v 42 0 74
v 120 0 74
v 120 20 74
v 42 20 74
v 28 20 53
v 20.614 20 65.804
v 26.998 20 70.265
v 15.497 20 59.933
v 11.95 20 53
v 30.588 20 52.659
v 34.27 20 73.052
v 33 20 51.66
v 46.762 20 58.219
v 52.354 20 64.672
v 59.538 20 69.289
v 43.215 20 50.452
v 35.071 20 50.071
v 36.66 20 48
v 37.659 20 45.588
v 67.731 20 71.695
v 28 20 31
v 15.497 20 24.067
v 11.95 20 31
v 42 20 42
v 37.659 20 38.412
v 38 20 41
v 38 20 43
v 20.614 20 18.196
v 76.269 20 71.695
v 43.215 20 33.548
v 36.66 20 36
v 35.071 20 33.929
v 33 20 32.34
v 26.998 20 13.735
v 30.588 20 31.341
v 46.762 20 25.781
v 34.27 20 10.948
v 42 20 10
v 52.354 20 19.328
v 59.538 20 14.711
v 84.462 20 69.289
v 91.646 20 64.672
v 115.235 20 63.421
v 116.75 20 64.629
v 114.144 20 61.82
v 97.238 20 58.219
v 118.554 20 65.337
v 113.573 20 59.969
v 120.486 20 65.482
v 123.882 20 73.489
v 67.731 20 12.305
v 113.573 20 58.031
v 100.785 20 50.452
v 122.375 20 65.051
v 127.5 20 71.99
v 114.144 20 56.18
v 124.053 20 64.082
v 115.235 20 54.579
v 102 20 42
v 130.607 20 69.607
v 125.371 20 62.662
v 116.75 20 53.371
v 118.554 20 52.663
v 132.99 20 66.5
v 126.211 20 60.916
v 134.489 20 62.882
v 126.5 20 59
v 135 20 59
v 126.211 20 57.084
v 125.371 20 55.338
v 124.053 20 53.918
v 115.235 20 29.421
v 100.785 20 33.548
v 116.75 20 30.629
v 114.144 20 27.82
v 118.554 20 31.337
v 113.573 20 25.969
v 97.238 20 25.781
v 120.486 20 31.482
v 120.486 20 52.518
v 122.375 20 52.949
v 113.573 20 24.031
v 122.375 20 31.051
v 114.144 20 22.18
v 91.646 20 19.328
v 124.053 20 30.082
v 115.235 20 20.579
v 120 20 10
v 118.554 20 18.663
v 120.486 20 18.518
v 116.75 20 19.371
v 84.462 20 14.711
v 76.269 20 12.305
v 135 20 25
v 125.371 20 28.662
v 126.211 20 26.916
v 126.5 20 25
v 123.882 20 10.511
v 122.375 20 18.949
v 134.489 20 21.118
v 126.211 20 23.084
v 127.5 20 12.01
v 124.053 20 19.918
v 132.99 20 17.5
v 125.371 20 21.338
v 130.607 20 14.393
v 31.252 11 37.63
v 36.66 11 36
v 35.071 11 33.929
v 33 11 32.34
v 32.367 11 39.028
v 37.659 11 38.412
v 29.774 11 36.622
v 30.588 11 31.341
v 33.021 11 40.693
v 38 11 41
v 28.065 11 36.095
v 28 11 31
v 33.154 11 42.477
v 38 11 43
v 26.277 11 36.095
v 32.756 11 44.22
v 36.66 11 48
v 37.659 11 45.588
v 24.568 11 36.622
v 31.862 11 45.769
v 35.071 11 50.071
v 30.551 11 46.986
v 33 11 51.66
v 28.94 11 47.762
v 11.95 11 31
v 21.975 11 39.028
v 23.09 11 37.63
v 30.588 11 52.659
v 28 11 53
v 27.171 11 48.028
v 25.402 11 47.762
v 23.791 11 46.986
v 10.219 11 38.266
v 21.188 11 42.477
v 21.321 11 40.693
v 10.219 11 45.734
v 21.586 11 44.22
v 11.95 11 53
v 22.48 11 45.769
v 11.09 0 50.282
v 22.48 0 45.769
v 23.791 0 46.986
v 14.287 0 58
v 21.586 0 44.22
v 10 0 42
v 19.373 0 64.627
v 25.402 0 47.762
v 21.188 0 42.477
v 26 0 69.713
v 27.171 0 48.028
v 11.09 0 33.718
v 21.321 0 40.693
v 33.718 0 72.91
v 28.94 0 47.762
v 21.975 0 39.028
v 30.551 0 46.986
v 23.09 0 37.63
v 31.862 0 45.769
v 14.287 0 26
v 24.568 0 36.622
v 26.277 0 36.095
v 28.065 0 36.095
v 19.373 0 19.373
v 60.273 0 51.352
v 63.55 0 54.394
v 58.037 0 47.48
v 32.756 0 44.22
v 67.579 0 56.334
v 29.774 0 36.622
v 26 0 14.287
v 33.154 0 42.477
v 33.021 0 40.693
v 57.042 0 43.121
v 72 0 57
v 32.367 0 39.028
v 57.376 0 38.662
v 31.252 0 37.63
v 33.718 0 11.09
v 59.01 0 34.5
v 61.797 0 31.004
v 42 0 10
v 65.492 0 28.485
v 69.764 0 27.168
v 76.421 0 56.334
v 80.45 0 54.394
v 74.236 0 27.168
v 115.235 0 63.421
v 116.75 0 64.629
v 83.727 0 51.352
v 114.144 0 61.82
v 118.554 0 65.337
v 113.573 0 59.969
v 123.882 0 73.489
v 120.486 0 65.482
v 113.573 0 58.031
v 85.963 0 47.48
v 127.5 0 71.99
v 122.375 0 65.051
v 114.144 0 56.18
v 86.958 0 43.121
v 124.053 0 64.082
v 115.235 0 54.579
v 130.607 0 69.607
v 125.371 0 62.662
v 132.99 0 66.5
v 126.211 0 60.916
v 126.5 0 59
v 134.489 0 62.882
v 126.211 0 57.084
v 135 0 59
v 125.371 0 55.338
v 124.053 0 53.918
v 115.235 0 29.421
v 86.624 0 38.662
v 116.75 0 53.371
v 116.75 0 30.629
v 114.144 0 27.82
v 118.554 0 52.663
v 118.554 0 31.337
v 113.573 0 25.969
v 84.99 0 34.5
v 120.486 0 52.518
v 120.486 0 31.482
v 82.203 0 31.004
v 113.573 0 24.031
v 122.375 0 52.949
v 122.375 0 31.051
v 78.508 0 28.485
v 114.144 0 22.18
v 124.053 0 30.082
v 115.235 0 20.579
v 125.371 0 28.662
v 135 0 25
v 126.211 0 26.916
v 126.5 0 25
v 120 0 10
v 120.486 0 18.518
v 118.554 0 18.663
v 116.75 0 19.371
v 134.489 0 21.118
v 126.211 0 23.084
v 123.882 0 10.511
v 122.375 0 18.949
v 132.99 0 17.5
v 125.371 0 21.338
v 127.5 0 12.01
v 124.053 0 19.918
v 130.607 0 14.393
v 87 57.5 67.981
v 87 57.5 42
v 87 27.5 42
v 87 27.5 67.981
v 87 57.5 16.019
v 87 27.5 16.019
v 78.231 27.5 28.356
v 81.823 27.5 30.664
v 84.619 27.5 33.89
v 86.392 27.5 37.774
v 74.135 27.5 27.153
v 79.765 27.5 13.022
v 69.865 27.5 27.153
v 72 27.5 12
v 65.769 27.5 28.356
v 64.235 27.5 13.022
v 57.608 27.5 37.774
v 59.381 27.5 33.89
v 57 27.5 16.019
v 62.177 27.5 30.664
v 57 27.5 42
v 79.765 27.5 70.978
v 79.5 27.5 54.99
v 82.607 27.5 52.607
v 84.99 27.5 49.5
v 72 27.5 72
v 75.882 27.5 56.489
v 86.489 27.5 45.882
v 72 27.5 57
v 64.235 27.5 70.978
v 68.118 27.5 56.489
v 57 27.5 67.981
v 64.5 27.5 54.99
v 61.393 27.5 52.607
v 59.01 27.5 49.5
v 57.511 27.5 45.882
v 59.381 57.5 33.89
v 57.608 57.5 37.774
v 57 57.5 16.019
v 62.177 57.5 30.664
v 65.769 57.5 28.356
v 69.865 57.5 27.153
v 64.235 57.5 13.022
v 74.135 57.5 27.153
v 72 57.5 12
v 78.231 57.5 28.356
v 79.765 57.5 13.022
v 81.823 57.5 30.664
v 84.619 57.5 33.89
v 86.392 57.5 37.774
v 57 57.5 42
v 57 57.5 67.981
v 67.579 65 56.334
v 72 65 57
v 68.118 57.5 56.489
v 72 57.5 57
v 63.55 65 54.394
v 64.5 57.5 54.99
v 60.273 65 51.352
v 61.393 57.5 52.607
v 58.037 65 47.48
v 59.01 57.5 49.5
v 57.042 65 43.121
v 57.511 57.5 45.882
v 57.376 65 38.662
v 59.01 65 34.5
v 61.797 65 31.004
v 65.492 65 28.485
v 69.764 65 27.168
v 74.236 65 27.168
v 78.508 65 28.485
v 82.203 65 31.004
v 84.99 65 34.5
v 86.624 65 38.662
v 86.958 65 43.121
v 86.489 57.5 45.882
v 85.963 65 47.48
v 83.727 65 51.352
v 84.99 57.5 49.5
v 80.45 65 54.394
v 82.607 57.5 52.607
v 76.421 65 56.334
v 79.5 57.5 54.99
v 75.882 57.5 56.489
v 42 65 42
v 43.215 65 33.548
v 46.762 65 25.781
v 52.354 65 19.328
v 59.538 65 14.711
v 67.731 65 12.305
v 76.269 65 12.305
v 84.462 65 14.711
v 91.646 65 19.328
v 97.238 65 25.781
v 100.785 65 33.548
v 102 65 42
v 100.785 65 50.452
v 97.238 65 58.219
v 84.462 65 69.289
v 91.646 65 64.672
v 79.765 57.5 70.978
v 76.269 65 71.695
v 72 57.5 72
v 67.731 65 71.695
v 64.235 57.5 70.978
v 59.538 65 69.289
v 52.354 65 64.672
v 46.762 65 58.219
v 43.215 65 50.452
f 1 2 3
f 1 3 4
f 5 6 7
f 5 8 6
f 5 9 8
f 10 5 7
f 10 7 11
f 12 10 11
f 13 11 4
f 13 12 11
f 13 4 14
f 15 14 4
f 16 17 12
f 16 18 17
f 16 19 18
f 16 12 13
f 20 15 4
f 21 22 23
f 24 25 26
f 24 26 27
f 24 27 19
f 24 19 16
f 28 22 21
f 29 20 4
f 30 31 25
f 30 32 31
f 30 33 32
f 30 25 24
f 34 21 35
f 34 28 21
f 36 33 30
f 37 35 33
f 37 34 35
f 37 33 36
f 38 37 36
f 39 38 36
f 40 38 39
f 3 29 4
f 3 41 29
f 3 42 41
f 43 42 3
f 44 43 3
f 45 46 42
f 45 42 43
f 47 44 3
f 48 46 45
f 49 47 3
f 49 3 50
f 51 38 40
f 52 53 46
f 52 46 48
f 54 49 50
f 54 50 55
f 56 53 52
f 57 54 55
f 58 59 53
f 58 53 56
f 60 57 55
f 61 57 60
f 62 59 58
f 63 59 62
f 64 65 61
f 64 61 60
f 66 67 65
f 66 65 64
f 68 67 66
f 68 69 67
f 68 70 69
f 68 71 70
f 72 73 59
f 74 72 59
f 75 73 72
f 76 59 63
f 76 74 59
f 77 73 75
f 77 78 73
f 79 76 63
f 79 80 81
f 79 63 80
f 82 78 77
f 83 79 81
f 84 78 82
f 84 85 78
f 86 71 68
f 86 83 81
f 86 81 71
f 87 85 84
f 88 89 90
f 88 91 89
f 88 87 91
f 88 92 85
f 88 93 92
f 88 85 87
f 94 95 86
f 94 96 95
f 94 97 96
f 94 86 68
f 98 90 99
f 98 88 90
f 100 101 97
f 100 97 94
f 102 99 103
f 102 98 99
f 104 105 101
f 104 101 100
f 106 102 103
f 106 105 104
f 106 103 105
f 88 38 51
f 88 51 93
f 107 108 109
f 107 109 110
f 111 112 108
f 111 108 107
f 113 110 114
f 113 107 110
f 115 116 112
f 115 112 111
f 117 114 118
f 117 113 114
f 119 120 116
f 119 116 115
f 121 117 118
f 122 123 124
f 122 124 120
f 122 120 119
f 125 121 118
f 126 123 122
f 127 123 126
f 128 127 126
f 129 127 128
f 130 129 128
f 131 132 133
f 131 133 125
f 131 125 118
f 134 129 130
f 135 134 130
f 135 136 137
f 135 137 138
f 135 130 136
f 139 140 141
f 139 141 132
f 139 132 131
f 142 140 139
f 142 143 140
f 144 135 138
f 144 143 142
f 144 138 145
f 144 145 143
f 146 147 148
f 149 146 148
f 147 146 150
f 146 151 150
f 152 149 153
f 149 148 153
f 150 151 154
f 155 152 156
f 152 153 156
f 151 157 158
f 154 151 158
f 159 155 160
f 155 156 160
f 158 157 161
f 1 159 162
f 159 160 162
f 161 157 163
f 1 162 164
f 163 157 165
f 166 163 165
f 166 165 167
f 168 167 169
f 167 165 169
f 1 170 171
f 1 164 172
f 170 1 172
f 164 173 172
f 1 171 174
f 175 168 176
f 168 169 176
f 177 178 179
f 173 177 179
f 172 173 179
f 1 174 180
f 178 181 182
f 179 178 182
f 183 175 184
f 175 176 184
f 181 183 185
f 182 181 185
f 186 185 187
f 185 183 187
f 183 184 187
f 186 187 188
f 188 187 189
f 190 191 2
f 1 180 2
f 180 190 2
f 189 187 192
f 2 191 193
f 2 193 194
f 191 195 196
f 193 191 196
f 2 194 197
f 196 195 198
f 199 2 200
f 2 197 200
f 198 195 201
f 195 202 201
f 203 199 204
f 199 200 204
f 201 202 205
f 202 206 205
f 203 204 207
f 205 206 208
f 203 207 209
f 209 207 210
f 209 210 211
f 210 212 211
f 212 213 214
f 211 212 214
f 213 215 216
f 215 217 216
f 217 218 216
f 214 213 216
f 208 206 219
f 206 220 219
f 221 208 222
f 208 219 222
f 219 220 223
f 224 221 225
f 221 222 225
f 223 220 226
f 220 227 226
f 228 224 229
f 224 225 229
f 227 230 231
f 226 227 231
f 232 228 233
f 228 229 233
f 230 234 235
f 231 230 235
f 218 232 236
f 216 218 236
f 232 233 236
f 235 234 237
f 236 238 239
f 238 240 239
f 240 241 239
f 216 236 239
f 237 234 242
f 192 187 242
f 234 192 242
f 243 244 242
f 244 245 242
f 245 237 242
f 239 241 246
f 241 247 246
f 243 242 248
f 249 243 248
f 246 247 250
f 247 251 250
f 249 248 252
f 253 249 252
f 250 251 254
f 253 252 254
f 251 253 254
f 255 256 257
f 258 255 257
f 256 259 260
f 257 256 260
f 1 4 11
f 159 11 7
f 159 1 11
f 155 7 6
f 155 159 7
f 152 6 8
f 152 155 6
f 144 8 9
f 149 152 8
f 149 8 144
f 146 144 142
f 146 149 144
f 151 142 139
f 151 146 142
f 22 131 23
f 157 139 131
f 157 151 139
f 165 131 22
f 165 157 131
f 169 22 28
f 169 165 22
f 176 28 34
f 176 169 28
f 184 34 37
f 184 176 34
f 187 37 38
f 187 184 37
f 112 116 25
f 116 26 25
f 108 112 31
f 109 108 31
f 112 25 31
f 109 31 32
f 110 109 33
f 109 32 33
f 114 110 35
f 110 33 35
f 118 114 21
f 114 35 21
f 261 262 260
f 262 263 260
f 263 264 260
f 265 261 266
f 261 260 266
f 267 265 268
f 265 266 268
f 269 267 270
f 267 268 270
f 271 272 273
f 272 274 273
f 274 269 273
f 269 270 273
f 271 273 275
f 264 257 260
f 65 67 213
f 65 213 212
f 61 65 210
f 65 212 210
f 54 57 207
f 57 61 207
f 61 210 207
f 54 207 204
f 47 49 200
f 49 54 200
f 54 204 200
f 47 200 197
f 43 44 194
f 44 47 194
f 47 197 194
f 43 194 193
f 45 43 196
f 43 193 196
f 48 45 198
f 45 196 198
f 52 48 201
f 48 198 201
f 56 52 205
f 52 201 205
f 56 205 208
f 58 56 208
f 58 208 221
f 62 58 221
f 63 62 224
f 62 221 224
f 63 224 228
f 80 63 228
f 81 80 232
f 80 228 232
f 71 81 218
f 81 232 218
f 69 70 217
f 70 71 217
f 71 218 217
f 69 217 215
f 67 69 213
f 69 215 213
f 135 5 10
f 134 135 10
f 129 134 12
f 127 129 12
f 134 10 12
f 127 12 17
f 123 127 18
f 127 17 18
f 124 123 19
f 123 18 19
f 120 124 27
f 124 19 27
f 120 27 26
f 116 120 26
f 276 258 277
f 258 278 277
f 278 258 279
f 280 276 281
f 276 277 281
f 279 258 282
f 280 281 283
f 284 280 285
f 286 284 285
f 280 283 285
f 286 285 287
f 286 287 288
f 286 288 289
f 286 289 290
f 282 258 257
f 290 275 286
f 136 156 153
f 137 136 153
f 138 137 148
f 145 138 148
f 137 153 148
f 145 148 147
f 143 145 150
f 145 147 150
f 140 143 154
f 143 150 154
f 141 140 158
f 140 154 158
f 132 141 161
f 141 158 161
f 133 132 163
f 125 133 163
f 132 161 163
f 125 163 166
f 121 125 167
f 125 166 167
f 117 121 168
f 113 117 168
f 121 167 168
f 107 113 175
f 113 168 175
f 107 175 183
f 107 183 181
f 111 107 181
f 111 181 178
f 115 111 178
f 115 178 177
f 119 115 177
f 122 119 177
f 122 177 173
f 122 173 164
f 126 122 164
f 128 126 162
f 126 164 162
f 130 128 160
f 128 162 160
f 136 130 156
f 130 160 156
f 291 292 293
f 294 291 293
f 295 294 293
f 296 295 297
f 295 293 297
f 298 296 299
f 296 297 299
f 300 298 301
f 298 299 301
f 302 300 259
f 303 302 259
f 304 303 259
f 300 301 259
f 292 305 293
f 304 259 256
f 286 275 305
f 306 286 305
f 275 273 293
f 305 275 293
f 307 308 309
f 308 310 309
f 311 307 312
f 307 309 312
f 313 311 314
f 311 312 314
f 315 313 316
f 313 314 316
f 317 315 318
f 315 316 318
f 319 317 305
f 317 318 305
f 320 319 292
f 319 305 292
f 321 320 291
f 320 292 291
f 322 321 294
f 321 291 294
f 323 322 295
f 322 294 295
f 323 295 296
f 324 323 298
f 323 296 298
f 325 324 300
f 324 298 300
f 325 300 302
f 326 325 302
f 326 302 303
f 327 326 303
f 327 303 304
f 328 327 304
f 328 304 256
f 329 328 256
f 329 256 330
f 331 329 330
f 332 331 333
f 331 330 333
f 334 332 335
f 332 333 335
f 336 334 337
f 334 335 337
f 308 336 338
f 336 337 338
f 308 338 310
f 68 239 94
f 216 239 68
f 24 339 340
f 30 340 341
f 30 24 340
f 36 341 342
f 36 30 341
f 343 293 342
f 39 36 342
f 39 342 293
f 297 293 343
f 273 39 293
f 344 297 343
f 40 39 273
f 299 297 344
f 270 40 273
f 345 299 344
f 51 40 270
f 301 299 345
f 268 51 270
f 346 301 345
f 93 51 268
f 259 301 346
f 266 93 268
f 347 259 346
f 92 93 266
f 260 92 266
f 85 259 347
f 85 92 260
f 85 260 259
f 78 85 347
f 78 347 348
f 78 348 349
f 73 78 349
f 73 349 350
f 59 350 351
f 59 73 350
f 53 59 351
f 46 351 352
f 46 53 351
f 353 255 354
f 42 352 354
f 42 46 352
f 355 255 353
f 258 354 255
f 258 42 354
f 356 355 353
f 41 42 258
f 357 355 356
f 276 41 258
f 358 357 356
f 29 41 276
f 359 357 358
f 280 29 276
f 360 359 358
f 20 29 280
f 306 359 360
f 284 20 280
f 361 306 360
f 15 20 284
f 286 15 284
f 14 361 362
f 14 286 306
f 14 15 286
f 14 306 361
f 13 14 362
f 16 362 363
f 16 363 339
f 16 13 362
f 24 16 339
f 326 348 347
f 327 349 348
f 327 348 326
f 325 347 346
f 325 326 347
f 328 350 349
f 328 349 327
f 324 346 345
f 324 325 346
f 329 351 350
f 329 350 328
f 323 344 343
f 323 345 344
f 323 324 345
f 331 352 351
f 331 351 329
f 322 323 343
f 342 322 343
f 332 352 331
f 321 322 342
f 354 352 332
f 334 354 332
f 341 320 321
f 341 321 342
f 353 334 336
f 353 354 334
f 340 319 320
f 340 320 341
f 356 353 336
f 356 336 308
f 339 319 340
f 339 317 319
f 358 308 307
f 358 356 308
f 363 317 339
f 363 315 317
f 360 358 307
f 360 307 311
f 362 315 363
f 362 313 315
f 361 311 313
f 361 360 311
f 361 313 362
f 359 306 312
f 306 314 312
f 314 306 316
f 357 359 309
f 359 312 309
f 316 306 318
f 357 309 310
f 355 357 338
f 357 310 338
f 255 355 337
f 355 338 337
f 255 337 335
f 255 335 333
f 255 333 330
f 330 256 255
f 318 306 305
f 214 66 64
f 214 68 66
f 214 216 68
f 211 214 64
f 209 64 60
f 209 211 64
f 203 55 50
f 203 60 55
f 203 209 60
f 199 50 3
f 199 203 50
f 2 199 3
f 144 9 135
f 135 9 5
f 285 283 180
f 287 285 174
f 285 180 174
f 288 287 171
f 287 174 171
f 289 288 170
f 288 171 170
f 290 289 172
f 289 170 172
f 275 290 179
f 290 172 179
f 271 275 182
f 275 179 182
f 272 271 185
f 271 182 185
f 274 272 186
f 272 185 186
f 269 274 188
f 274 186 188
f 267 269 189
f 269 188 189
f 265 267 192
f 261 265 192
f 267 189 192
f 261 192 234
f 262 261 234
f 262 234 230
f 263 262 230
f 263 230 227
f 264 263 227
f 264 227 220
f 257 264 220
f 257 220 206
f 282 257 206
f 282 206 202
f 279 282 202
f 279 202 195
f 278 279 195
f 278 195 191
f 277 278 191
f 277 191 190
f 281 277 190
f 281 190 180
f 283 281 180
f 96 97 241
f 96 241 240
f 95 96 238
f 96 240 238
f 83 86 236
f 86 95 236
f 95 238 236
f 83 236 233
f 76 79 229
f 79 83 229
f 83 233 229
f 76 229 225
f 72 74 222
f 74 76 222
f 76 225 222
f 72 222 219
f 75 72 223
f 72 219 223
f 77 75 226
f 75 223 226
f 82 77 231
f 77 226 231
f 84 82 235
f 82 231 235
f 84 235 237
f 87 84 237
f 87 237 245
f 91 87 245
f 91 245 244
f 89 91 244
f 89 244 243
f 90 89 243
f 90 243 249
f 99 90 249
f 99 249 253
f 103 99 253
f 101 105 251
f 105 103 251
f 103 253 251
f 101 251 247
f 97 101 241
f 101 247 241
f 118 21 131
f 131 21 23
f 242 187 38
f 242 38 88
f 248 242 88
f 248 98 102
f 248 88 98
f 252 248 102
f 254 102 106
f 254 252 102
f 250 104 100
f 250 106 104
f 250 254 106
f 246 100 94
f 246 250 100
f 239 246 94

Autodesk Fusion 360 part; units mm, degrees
sketch "Sketch3" plane through (0, 0, 0) normal (0, 1, 0) x (1, 0, 0)
  line L0 (42, -10) -> (120, -10)
  line L1 (135, -25) -> (135, -59)
  line L2 (120, -74) -> (42, -74)
  line L3 (10, -42) -> (10, -42)
  arc A0 (42, -10) -> (10, -42) centre (42, -42) ccw
  arc A1 (10, -42) -> (42, -74) centre (42, -42) ccw
  arc A2 (135, -25) -> (120, -10) centre (120, -25) ccw
  arc A3 (120, -74) -> (135, -59) centre (120, -59) ccw
  circle A4 centre (120, -59) radius 6.5
  circle A5 centre (120, -25) radius 6.5
  point P0 (10, -10)
  point P1 (135, -10)
  point P2 (10, -74)
  dimension "d17" = 125
  dimension "d18" = 64
  dimension "d19" = 32
  dimension "d20" = 32
  dimension "d21" = 15
  dimension "d22" = 15
  dimension "d23" = 13
  dimension "d24" = 13
extrude "Extrude3" add sketch "Sketch3" along normal blind 20
sketch "Sketch4" plane through (0, 20, 0) normal (0, 1, 0) x (-1, 0, 0)
  circle A0 centre (-120, 59) radius 6.5
  circle A1 centre (-120, 25) radius 6.5
  arc A2 (-42, 10) -> (-42, 74) centre (-42, 42) ccw
  line L0 (-42, 74) -> (-120, 74)
  arc A3 (-120, 74) -> (-135, 59) centre (-120, 59) ccw
  line L1 (-135, 59) -> (-135, 25)
  arc A4 (-135, 25) -> (-120, 10) centre (-120, 25) ccw
  line L2 (-120, 10) -> (-42, 10)
  line L3 (-120, 59) -> (-72, 59)
  line L4 (-120, 25) -> (-72, 25)
  line L5 (-72, 59) -> (-72, 25)
  line L6 (-72, 59) -> (-72, 42)
  circle A5 centre (-72, 42) radius 30
  dimension "d27" = 48
  dimension "d28" = 48
  dimension "d29" = 60
extrude "Extrude4" add sketch "Sketch4" along normal blind 45 contours L3 L4 L5 L6 A5 | L3 L4 L5 L6 A5
hole "Hole1" at (72, 65, 42) direction (0, -1, 0) diameter 30 depth 90 tip angle 118
sketch "Sketch5" plane through (0, 0, 74) normal (0, 0, 1) x (1, 0, 0)
  line L0 (42, 0) -> (120, 0)
  line L1 (120, 0) -> (120, 20)
  line L2 (120, 20) -> (42, 20)
  line L3 (42, 20) -> (42, 0)
sketch "Sketch6" plane through (0, 0, 0) normal (0, 0, 1) x (1, 0, 0)
  line L0 (42, 65) -> (72, 65)
  line L1 (42, 65) -> (42, 57.5)
  line L2 (42, 57.5) -> (57, 57.5)
  line L3 (57, 57.5) -> (87, 57.5)
  line L4 (87, 57.5) -> (87, 27.5)
  line L5 (87, 27.5) -> (57, 27.5)
  line L6 (57, 27.5) -> (57, 57.5)
  dimension "d35" = 30
  dimension "d36" = 7.5
  dimension "d37" = 30
  dimension "d38" = 30
extrude "Extrude5" cut sketch "Sketch6" along normal blind 200
sketch "Sketch7" plane through (0, 0, 0) normal (0, 1, 0) x (1, 0, 0)
sketch "Sketch8" plane through (0, 20, 0) normal (0, 1, 0) x (-1, 0, 0)
  circle A0 centre (-72, 42) radius 30
  circle A1 centre (-120, 59) radius 6.5
  circle A2 centre (-120, 25) radius 6.5
  arc A3 (-42, 10) -> (-42, 74) centre (-42, 42) ccw
  line L0 (-42, 74) -> (-120, 74)
  arc A4 (-120, 74) -> (-135, 59) centre (-120, 59) ccw
  line L1 (-135, 59) -> (-135, 25)
  arc A5 (-135, 25) -> (-120, 10) centre (-120, 25) ccw
  line L2 (-120, 10) -> (-42, 10)
  line L3 (-72, 42) -> (-27, 42)
  circle A6 centre (-27, 42) radius 6.5
  dimension "d41" = 45
  dimension "d42" = 13
extrude "Extrude6" cut sketch "Sketch8" against normal blind 9 contours A6
sketch "Sketch9" plane through (0, 20, 0) normal (0, 1, 0) x (-1, 0, 0)
  circle A0 centre (-27, 42) radius 6.5
  circle A1 centre (-72, 42) radius 30
  circle A2 centre (-120, 59) radius 6.5
  circle A3 centre (-120, 25) radius 6.5
  arc A4 (-42, 10) -> (-42, 74) centre (-42, 42) ccw
  line L0 (-42, 74) -> (-120, 74)
  arc A5 (-120, 74) -> (-135, 59) centre (-120, 59) ccw
  line L1 (-135, 59) -> (-135, 25)
  arc A6 (-135, 25) -> (-120, 10) centre (-120, 25) ccw
  line L2 (-120, 10) -> (-42, 10)
  line L3 (-27, 42) -> (-27, 31)
  line L4 (-27, 31) -> (-6.9654, 31)
  line L5 (-6.9654, 31) -> (-6.9654, 50)
  line L6 (-6.9654, 50) -> (-6.9654, 31)
  line L7 (-27, 42) -> (-27, 53)
  line L8 (-27, 53) -> (-28, 53)
  line L9 (-38, 43) -> (-38, 41)
  line L10 (-38, 31) -> (-27, 31)
  line L11 (-27, 31) -> (-27, 53)
  line L12 (-28, 31) -> (-6, 31)
  line L13 (-6, 31) -> (-6, 53)
  line L14 (-6, 53) -> (-38, 53)
  line L15 (-38, 53) -> (-38, 31)
  arc A7 (-38, 41) -> (-28, 31) centre (-28, 41) ccw
  arc A8 (-28, 53) -> (-38, 43) centre (-28, 43) ccw
  point P0 (-38, 53)
  dimension "d45" = 11
  dimension "d46" = 11
  dimension "d47" = 11
  dimension "d48" = 22
  dimension "d49" = 32
  dimension "d50" = 22
  dimension "d51" = 10
  dimension "d52" = 10
extrude "Extrude7" cut sketch "Sketch9" against normal blind 9 contours A0 A4 L3 L4 L7 L11 L12 L14 | A0 L3 L7 L8 L9 L10 L11 L12 L14 L15 A7 A8
hole "Hole2" at (27.171, 11, 42.0282) direction (0, -1, 0) diameter 12 depth 13 tip angle 118
